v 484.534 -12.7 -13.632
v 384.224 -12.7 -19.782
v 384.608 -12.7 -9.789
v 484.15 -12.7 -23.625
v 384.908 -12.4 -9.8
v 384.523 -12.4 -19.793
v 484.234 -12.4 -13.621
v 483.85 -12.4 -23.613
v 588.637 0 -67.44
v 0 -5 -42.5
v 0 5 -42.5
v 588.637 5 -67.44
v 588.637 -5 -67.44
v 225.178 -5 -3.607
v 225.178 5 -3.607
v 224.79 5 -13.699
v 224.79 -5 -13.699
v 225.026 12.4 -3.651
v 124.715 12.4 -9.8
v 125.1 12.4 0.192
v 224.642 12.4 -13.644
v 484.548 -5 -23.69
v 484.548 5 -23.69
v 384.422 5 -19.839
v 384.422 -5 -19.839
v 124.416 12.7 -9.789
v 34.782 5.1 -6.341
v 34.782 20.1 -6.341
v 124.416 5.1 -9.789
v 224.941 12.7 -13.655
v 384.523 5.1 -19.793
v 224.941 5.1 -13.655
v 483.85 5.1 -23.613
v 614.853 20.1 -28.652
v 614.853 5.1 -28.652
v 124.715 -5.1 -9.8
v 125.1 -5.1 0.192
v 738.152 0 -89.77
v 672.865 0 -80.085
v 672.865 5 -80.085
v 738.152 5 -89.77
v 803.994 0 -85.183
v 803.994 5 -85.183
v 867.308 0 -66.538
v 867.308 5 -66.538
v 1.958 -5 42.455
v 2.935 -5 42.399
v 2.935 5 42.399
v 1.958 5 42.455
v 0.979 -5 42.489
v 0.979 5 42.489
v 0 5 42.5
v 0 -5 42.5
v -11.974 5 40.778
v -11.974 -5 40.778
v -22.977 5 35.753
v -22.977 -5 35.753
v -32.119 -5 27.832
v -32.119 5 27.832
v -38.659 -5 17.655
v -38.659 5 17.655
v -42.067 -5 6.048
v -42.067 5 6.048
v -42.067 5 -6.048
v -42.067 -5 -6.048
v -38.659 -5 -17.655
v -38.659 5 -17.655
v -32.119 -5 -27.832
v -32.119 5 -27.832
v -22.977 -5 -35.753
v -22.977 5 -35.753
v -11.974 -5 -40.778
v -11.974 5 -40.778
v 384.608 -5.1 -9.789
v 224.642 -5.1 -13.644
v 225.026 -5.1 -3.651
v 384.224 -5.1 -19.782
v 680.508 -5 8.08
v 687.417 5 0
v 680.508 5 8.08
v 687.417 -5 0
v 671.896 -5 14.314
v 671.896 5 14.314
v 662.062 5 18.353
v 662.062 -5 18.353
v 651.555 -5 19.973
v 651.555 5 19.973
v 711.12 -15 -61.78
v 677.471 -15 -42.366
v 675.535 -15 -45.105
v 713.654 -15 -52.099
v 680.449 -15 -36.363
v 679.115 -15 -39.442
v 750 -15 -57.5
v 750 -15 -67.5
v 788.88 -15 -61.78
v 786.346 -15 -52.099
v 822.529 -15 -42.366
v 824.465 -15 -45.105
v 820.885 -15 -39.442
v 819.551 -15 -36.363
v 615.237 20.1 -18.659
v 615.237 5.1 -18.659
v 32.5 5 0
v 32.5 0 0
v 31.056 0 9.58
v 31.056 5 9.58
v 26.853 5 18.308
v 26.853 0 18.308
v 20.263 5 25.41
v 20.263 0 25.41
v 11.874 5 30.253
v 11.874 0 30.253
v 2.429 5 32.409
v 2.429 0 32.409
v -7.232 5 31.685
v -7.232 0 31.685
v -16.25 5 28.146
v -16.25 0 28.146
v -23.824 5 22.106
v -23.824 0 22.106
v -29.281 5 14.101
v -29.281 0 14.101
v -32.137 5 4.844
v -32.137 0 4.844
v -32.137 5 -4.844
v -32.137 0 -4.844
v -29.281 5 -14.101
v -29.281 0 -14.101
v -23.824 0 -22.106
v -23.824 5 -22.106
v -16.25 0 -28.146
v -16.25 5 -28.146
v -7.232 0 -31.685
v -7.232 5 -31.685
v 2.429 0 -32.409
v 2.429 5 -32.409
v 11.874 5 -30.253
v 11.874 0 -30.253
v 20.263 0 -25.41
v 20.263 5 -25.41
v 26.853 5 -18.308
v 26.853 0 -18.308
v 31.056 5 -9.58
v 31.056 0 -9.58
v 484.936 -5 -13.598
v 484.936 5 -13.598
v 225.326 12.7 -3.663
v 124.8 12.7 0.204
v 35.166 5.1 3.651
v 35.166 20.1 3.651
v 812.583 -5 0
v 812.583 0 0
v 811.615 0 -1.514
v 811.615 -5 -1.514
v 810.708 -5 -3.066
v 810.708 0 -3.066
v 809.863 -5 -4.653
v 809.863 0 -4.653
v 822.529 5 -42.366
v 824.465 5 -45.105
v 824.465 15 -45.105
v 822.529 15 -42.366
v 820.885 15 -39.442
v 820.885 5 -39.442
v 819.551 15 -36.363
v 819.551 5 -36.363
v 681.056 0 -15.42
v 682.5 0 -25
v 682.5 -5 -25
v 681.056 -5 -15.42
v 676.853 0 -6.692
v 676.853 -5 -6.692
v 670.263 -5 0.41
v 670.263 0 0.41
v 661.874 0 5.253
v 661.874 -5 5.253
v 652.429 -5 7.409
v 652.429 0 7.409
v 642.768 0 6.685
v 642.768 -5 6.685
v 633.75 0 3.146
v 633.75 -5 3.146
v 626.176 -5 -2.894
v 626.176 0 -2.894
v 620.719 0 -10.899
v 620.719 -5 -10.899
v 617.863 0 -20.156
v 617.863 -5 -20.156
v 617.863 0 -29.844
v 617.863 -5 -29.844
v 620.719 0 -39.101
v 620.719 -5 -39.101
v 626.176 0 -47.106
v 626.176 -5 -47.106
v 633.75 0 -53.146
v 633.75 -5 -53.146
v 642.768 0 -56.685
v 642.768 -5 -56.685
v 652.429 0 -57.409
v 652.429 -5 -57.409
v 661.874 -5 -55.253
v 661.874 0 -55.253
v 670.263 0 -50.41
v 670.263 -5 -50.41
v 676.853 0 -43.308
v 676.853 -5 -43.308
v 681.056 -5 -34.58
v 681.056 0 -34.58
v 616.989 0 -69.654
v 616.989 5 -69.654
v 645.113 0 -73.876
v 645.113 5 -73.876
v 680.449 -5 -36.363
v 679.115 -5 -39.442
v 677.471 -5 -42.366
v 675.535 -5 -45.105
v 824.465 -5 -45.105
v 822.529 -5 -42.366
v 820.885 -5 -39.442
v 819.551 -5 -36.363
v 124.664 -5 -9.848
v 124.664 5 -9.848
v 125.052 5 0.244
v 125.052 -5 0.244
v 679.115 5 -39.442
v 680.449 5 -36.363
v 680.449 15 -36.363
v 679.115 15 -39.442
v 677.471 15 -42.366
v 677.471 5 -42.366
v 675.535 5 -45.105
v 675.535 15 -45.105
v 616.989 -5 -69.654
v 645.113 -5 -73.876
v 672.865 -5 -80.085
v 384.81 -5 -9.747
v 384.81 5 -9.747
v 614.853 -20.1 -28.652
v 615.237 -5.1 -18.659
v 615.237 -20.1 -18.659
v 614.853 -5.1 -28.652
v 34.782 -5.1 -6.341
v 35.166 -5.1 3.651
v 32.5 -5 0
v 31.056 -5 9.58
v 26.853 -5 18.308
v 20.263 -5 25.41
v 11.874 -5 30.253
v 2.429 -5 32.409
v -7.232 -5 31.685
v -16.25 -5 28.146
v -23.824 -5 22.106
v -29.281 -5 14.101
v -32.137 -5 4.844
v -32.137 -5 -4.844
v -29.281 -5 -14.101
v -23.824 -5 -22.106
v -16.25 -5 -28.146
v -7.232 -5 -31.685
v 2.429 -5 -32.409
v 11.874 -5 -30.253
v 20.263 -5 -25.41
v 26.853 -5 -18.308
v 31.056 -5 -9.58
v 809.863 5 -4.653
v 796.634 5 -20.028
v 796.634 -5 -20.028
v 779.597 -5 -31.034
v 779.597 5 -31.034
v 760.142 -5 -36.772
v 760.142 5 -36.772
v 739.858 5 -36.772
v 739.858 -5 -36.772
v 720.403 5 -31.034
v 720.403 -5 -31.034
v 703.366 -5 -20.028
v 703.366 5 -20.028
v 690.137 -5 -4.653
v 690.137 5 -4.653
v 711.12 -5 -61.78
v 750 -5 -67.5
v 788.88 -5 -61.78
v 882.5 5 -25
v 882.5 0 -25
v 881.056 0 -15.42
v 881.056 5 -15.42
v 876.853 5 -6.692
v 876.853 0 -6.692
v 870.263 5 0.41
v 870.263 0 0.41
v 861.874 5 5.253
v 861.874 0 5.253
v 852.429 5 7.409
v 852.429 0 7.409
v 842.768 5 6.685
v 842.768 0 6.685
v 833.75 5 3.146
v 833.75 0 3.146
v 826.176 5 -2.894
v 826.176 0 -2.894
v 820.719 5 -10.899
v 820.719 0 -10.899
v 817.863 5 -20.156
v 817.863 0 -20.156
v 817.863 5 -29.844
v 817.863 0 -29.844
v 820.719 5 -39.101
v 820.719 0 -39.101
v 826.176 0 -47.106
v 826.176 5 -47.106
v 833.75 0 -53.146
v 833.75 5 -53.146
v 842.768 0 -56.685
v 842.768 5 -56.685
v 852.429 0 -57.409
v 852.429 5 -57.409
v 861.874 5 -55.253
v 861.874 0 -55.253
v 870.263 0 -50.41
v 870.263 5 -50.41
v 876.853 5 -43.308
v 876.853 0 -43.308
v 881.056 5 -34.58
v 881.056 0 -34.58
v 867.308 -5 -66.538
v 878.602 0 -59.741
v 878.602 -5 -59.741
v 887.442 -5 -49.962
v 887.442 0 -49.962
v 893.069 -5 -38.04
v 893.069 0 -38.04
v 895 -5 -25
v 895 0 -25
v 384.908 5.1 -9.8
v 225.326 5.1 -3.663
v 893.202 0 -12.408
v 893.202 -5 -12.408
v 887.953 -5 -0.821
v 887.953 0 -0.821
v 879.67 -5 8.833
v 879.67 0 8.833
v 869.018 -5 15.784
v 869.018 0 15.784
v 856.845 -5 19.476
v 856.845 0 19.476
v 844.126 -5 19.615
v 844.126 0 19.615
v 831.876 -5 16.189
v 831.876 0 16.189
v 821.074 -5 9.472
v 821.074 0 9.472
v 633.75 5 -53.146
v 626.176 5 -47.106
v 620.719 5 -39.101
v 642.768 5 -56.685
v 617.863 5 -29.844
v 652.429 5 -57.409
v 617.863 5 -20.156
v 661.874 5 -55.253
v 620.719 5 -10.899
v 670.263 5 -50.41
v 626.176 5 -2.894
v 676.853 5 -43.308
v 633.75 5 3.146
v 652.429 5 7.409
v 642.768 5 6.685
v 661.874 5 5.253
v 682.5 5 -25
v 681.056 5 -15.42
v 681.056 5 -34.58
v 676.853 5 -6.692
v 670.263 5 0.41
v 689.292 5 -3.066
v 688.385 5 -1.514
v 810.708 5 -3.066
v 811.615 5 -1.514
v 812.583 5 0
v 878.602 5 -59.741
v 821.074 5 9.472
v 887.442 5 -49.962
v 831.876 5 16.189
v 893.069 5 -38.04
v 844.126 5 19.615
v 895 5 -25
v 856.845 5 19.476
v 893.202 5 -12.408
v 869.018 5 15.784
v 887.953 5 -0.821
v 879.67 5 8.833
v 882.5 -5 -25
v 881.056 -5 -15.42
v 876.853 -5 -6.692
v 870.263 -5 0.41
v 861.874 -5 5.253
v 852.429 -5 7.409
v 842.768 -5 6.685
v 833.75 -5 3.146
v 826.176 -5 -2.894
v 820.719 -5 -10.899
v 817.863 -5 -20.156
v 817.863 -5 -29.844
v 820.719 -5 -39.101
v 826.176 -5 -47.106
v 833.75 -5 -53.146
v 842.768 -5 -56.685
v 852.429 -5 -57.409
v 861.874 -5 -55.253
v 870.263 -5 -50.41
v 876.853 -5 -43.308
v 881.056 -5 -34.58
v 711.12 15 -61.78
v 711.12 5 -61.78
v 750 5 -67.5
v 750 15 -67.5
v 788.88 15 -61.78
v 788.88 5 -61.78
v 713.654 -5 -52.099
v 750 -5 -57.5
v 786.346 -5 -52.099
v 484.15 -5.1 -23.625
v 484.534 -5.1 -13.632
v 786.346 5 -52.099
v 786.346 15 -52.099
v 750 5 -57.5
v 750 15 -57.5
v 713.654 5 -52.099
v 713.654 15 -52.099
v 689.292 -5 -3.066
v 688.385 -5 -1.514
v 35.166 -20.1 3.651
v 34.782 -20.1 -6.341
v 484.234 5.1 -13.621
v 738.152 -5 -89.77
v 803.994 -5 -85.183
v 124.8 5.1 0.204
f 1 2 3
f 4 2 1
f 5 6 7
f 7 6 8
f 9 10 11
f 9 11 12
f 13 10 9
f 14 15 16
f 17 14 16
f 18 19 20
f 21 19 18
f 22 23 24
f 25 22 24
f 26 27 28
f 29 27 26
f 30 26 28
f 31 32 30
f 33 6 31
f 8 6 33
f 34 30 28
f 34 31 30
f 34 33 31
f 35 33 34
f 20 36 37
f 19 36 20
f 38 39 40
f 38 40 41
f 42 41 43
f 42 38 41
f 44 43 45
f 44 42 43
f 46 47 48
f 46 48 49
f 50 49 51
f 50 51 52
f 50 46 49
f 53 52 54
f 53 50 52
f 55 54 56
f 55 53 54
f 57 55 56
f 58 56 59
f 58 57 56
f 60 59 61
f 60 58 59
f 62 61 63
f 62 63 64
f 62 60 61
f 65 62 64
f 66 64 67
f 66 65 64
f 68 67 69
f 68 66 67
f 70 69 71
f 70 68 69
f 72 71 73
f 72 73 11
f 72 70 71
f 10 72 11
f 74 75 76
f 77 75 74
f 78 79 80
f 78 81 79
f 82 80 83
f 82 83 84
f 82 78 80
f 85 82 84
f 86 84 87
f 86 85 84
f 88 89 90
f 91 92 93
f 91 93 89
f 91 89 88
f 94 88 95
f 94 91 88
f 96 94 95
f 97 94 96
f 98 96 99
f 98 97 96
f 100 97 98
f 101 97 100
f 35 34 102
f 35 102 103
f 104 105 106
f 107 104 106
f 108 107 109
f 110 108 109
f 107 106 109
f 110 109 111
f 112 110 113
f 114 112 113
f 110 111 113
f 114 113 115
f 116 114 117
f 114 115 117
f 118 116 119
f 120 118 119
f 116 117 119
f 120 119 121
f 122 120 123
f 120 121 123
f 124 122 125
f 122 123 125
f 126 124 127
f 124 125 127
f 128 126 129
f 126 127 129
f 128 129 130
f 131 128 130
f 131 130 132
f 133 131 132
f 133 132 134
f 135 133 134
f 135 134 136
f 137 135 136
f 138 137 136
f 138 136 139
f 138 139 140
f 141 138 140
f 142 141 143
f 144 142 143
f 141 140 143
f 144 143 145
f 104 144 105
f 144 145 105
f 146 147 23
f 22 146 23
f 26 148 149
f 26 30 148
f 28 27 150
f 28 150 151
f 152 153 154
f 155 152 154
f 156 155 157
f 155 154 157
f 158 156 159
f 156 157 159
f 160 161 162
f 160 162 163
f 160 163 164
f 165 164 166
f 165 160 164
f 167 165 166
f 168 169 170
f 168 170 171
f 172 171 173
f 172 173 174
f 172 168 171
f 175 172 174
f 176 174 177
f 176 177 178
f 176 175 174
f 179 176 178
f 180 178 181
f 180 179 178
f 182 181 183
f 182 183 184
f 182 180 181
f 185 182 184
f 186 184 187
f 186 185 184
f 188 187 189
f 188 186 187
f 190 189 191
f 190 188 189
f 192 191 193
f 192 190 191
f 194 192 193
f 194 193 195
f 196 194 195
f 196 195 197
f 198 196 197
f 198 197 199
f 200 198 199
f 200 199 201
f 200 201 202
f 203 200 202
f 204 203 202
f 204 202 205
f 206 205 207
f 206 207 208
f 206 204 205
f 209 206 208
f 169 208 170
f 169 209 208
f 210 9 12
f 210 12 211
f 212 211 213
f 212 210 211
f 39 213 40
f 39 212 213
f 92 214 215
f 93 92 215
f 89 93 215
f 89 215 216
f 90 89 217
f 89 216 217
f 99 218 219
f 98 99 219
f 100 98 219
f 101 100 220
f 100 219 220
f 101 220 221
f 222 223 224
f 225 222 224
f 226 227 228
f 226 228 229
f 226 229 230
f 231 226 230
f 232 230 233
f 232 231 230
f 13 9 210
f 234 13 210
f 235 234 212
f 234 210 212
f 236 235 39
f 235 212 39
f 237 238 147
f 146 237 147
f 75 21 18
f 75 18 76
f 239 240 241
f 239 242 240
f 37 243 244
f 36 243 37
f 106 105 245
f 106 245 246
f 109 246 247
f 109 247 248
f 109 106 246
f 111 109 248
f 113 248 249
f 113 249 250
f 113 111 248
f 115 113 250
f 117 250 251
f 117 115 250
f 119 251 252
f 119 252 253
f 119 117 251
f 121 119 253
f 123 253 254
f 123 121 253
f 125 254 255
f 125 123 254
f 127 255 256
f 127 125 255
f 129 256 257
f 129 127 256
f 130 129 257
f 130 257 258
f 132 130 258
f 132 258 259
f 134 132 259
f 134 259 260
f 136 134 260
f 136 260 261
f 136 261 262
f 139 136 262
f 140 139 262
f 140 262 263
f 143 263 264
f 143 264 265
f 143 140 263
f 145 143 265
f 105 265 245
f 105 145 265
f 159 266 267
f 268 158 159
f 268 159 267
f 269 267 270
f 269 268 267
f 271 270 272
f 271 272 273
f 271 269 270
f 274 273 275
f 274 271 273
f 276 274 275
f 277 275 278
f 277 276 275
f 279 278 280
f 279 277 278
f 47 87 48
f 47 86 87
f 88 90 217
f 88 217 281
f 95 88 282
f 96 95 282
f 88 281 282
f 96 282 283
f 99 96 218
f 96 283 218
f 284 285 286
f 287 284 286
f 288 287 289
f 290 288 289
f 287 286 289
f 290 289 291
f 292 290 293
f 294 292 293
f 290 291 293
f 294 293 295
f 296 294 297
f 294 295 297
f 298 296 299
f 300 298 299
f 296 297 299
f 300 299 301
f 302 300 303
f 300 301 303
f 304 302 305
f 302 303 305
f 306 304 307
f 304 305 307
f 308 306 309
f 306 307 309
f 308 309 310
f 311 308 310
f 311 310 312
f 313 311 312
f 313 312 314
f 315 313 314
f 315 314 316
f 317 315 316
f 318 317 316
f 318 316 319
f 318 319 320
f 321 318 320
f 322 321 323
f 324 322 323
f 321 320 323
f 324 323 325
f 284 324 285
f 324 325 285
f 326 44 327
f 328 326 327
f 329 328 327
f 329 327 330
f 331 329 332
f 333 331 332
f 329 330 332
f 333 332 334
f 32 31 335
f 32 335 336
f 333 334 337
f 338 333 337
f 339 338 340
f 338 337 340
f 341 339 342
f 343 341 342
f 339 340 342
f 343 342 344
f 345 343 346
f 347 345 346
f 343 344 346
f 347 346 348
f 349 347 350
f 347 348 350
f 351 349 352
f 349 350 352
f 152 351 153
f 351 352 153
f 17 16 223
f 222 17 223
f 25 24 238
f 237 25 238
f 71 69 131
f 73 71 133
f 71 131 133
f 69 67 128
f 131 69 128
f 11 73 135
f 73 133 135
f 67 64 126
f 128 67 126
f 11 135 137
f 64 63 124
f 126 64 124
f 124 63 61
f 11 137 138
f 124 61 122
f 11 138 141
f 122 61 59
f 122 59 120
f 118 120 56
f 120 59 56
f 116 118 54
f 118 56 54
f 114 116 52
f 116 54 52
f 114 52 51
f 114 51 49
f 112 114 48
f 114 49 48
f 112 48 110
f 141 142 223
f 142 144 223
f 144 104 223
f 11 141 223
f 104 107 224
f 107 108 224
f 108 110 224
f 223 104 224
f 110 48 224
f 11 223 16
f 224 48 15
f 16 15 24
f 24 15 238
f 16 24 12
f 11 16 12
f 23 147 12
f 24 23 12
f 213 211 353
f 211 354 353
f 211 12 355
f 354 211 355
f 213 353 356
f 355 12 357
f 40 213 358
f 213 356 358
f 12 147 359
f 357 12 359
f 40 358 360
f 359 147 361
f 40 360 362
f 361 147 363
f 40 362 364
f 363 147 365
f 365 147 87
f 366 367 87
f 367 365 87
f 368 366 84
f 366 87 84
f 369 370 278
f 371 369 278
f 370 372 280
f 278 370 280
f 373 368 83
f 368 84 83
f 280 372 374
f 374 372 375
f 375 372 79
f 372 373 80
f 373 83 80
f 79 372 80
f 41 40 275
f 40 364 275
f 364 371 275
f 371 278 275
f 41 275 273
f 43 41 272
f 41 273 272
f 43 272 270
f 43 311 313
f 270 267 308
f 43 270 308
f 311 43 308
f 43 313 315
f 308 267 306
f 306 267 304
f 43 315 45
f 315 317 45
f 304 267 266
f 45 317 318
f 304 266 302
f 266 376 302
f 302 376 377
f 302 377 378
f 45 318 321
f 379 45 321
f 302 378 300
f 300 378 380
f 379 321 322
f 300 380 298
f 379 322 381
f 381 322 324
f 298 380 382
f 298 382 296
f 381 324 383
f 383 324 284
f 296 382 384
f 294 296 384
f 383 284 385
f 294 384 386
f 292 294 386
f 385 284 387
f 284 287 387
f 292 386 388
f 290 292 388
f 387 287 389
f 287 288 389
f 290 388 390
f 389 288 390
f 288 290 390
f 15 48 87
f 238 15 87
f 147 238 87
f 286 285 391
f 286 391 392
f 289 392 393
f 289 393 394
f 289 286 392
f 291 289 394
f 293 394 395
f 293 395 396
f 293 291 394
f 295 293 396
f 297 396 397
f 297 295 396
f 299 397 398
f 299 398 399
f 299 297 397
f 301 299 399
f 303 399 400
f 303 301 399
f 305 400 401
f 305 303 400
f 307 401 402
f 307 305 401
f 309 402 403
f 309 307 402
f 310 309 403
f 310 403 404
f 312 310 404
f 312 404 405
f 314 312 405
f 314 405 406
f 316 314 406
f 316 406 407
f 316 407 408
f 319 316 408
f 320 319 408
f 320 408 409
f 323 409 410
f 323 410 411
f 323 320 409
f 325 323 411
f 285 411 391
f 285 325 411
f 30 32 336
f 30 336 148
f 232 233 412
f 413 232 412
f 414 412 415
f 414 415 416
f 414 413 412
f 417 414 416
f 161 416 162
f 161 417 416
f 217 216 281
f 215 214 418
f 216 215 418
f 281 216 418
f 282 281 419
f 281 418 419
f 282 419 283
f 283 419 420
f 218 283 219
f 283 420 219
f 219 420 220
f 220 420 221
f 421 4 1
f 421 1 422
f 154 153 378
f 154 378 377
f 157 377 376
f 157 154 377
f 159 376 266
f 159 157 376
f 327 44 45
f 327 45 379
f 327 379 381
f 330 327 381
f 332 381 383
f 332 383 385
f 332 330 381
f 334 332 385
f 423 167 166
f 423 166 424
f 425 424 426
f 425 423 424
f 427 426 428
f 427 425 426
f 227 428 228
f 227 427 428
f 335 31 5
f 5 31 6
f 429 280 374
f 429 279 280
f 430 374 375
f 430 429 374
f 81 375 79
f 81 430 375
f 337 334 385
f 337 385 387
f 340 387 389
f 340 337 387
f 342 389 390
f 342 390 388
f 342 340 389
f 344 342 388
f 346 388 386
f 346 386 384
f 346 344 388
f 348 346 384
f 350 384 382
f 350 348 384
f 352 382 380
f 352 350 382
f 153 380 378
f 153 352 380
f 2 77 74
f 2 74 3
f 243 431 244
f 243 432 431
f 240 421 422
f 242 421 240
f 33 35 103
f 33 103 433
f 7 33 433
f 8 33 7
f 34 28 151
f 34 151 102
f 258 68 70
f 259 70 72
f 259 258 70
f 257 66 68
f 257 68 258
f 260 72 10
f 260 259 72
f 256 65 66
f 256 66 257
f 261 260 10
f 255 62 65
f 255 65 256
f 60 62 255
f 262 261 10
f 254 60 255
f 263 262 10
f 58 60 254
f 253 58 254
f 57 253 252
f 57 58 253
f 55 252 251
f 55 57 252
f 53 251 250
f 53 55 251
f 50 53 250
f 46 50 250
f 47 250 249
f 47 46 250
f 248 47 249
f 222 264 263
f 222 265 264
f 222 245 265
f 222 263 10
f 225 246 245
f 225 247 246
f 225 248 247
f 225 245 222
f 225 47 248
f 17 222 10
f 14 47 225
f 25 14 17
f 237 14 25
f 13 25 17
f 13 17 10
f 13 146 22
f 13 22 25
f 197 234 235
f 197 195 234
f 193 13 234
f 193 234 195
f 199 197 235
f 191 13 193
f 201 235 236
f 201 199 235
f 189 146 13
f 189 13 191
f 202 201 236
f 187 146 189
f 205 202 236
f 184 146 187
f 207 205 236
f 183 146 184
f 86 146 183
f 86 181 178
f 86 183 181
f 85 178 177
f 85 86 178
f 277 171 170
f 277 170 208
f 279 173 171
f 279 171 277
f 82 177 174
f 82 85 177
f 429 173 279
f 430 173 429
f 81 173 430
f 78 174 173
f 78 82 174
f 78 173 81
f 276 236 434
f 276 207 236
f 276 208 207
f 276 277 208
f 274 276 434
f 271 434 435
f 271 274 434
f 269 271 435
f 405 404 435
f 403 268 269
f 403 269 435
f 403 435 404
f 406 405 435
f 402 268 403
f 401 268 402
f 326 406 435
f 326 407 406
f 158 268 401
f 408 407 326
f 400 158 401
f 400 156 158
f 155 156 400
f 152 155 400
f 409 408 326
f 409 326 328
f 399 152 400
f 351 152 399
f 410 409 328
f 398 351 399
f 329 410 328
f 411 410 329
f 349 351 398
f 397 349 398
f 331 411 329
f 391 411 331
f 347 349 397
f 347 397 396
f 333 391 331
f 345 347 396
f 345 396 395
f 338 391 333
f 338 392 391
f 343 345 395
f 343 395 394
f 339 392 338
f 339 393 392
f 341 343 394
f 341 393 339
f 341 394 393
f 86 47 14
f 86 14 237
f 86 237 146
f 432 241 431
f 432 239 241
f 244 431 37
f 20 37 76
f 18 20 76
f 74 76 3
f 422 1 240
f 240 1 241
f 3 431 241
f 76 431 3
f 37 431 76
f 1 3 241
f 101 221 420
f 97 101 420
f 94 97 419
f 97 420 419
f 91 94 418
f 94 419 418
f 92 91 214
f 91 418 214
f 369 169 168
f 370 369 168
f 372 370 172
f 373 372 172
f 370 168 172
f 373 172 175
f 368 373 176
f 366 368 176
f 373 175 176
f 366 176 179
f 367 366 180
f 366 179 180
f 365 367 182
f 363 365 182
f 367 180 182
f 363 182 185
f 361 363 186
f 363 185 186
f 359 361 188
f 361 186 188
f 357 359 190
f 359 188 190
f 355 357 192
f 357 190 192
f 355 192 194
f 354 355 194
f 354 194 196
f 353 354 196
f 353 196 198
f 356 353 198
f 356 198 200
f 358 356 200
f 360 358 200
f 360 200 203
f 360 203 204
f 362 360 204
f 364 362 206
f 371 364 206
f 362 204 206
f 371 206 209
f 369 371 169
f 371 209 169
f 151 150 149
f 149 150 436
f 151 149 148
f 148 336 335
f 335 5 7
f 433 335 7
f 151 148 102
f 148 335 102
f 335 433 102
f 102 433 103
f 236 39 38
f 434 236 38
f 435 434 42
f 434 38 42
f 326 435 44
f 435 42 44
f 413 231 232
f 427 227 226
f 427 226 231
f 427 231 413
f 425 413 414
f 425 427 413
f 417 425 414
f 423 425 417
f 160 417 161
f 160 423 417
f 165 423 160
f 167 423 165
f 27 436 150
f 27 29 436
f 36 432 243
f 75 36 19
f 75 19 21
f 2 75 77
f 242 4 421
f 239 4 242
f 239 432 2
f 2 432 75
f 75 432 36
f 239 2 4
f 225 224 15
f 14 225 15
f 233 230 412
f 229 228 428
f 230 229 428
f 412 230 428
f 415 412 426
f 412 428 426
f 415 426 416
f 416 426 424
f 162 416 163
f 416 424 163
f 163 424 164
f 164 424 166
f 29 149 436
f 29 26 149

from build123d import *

# Parameters (mm, degrees)
F0_R          = 32.5
F1_DEPTH      = 5
F1_DEPTH_BACK = 5
F5_DEPTH      = 25
F6_DEPTH      = 5
F6_DEPTH_BACK = 5
F4_W          = 99.4
F4_H          = 17.5
F8_DEPTH      = 10


with BuildPart() as f1:
    # F0 (on Front) → F1 (new body, two sides)
    with BuildSketch(Plane.XZ) as f1_sk:
        with BuildLine():
            ThreePointArc((15.2901799608, 39.6542607643), (7.6425019123, 41.0632246714), (0, 42.5))
            ThreePointArc((0, 42.5), (-42.5, 0), (0, -42.5))
            ThreePointArc((0, -42.5), (4.6811187295, -41.9725217651), (9.3634275195, -41.4557140222))
            ThreePointArc((9.3634275195, -41.4557140222), (33.1978588886, -26.535865639), (42.5, 0))
            ThreePointArc((42.5, 0), (35.0434205546, 24.0459700539), (15.2901799608, 39.6542607643))
        make_face()
        Circle(F0_R, mode=Mode.SUBTRACT)
        with BuildLine():
            ThreePointArc((2.9352828897, 42.3985154735), (1.4685183648, 42.474621291), (0, 42.5))
            Line((0, 42.5), (2.9352828897, 42.3985154735))
        make_face()
        with BuildLine():
            Line((2.9352828897, 42.3985154735), (0, 42.5))
            ThreePointArc((0, 42.5), (7.6425019123, 41.0632246714), (15.2901799608, 39.6542607643))
            ThreePointArc((15.2901799608, 39.6542607643), (9.2154548182, 41.488858655), (2.9352828897, 42.3985154735))
        make_face()
        with BuildLine():
            ThreePointArc((9.3634275195, -41.4557140222), (4.6811187295, -41.9725217651), (0, -42.5))
            ThreePointArc((0, -42.5), (4.710740603, -42.238121679), (9.3634275195, -41.4557140222))
        make_face()
        with BuildLine():
            ThreePointArc((9.3634275195, -41.4557140222), (4.710740603, -42.238121679), (0, -42.5))
            Line((0, -42.5), (588.6371870725, -67.4404434194))
            ThreePointArc((588.6371870725, -67.4404434194), (631.0886283847, -71.5145464261), (672.865048635, -80.0850712556))
            ThreePointArc((672.865048635, -80.0850712556), (656.4952738109, -75.3133930433), (640.417736754, -69.6343752639))
            ThreePointArc((640.417736754, -69.6343752639), (325.9734547012, -31.2943752337), (9.3634275195, -41.4557140222))
        make_face()
        with BuildLine():
            Line((651.5549017981, 19.9731284257), (2.9352828897, 42.3985154735))
            ThreePointArc((2.9352828897, 42.3985154735), (9.2154548182, 41.488858655), (15.2901799608, 39.6542607643))
            ThreePointArc((15.2901799608, 39.6542607643), (332.6858335017, 5.9969290407), (651.5549017981, 19.9731284257))
        make_face()
        with BuildLine():
            ThreePointArc((651.5549017981, 19.9731284257), (332.6858335017, 5.9969290407), (15.2901799608, 39.6542607643))
            ThreePointArc((15.2901799608, 39.6542607643), (35.0434205546, 24.0459700539), (42.5, 0))
            ThreePointArc((42.5, 0), (33.1978588886, -26.535865639), (9.3634275195, -41.4557140222))
            ThreePointArc((9.3634275195, -41.4557140222), (325.9734547012, -31.2943752337), (640.417736754, -69.6343752639))
            ThreePointArc((640.417736754, -69.6343752639), (656.4952738109, -75.3133930433), (672.865048635, -80.0850712556))
            ThreePointArc((672.865048635, -80.0850712556), (771.1976399021, -89.262485467), (867.3076923077, -66.5384615385))
            ThreePointArc((867.3076923077, -66.5384615385), (817.0187580388, -55.6143377962), (809.8629915161, -4.652505069))
            ThreePointArc((809.8629915161, -4.652505069), (750, -37.5), (690.1370084839, -4.652505069))
            ThreePointArc((690.1370084839, -4.652505069), (688.7326126754, -2.3520847948), (687.4165738677, 0))
            ThreePointArc((687.4165738677, 0), (671.8957859797, 14.3137960051), (651.5549017981, 19.9731284257))
        make_face()
        with Locations((650, -25)):
            Circle(F0_R, mode=Mode.SUBTRACT)
        with BuildLine():
            ThreePointArc((690.1370084839, -4.652505069), (688.846505438, -2.2854888837), (687.4165738677, 0))
            ThreePointArc((687.4165738677, 0), (688.7326126754, -2.3520847948), (690.1370084839, -4.652505069))
        make_face()
        with BuildLine():
            ThreePointArc((809.8629915161, -4.652505069), (817.0187580388, -55.6143377962), (867.3076923077, -66.5384615385))
            ThreePointArc((867.3076923077, -66.5384615385), (887.4422632452, -49.9615088301), (895, -25))
            ThreePointArc((895, -25), (863.0624304008, 18.0624304008), (812.5834261323, 0))
            ThreePointArc((812.5834261323, 0), (811.2673873246, -2.3520847948), (809.8629915161, -4.652505069))
        make_face()
        with Locations((850, -25)):
            Circle(F0_R, mode=Mode.SUBTRACT)
        with BuildLine():
            ThreePointArc((812.5834261323, 0), (811.153494562, -2.2854888837), (809.8629915161, -4.652505069))
            ThreePointArc((809.8629915161, -4.652505069), (811.2673873246, -2.3520847948), (812.5834261323, 0))
        make_face()
    extrude(amount=F1_DEPTH)
    extrude(f1_sk.sketch, amount=-F1_DEPTH_BACK)

    # F2 (on face) → F5 (cut)
    with BuildSketch(Plane(origin=(0, 5, 0), x_dir=(-1, 0, 0), z_dir=(0, 1, 0))):
        Polygon((-484.9356830803, -13.5976385994), (-484.547508547, -23.6901764632), (-384.421538849, -19.8391776286), (-384.8097133822, -9.7466397649), align=None)
        Polygon((-125.0517710368, 0.2440503253), (-225.1777407349, -3.6069485092), (-224.7895662016, -13.699486373), (-124.6635965036, -9.8484875384), align=None)
    extrude(amount=-F5_DEPTH, mode=Mode.SUBTRACT)


with BuildPart() as f6:
    # F4 (on 3pt) → F6 (new body, two sides)
    with BuildSketch(Plane(origin=(0, 0, 0), x_dir=(0.9992611746, 0, -0.0384331221), z_dir=(-0.0384331221, 0, -0.9992611746))) as f6_sk:
        Polygon((35, 20.1), (35, 5.1), (125, 5.1), (125, -12.4), (225, -12.4), (225, 5.1), (384.7, 5.1), (384.7, 12.7), (484.7, 12.7), (484.7, 5.1), (615.5, 5.1), (615.5, 20.1), align=None)
    extrude(amount=F6_DEPTH)
    extrude(f6_sk.sketch, amount=-F6_DEPTH_BACK)


with BuildPart() as f6b:
    # F4 (on 3pt) → F6, piece 2 (new body, two sides)
    with BuildSketch(Plane(origin=(0, 0, 0), x_dir=(0.9992611746, 0, -0.0384331221), z_dir=(-0.0384331221, 0, -0.9992611746))) as f6_2_sk:
        Polygon((124.7, -5.1), (35, -5.1), (35, -20.1), (615.5, -20.1), (615.5, -5.1), (484.4, -5.1), (385, -5.1), (225.3, -5.1), (225.3, -12.7), (124.7, -12.7), align=None)
        with Locations((434.7, 3.65)):
            Rectangle(F4_W, F4_H)
    extrude(amount=F6_DEPTH)
    extrude(f6_2_sk.sketch, amount=-F6_DEPTH_BACK)


with BuildPart() as f8:
    # F7 (on face) → F8 (new body)
    with BuildSketch(Plane.XZ.offset(5)):
        with BuildLine():
            ThreePointArc((819.5513180488, -36.3634399472), (750, -57.5), (680.4486819512, -36.3634399472))
            ThreePointArc((680.4486819512, -36.3634399472), (678.3309710788, -40.9250142145), (675.5348549099, -45.1052526651))
            ThreePointArc((675.5348549099, -45.1052526651), (750, -67.5000028187), (824.4651450901, -45.1052526651))
            ThreePointArc((824.4651450901, -45.1052526651), (821.6690289212, -40.9250142145), (819.5513180488, -36.3634399472))
        make_face()
    extrude(amount=F8_DEPTH)


with BuildPart() as f9_1:
    # F9: instance of F8
    add(f8.part.mirror(Plane.XZ))


solid = Compound([f1.part, f6.part, f6b.part, f8.part, f9_1.part])
